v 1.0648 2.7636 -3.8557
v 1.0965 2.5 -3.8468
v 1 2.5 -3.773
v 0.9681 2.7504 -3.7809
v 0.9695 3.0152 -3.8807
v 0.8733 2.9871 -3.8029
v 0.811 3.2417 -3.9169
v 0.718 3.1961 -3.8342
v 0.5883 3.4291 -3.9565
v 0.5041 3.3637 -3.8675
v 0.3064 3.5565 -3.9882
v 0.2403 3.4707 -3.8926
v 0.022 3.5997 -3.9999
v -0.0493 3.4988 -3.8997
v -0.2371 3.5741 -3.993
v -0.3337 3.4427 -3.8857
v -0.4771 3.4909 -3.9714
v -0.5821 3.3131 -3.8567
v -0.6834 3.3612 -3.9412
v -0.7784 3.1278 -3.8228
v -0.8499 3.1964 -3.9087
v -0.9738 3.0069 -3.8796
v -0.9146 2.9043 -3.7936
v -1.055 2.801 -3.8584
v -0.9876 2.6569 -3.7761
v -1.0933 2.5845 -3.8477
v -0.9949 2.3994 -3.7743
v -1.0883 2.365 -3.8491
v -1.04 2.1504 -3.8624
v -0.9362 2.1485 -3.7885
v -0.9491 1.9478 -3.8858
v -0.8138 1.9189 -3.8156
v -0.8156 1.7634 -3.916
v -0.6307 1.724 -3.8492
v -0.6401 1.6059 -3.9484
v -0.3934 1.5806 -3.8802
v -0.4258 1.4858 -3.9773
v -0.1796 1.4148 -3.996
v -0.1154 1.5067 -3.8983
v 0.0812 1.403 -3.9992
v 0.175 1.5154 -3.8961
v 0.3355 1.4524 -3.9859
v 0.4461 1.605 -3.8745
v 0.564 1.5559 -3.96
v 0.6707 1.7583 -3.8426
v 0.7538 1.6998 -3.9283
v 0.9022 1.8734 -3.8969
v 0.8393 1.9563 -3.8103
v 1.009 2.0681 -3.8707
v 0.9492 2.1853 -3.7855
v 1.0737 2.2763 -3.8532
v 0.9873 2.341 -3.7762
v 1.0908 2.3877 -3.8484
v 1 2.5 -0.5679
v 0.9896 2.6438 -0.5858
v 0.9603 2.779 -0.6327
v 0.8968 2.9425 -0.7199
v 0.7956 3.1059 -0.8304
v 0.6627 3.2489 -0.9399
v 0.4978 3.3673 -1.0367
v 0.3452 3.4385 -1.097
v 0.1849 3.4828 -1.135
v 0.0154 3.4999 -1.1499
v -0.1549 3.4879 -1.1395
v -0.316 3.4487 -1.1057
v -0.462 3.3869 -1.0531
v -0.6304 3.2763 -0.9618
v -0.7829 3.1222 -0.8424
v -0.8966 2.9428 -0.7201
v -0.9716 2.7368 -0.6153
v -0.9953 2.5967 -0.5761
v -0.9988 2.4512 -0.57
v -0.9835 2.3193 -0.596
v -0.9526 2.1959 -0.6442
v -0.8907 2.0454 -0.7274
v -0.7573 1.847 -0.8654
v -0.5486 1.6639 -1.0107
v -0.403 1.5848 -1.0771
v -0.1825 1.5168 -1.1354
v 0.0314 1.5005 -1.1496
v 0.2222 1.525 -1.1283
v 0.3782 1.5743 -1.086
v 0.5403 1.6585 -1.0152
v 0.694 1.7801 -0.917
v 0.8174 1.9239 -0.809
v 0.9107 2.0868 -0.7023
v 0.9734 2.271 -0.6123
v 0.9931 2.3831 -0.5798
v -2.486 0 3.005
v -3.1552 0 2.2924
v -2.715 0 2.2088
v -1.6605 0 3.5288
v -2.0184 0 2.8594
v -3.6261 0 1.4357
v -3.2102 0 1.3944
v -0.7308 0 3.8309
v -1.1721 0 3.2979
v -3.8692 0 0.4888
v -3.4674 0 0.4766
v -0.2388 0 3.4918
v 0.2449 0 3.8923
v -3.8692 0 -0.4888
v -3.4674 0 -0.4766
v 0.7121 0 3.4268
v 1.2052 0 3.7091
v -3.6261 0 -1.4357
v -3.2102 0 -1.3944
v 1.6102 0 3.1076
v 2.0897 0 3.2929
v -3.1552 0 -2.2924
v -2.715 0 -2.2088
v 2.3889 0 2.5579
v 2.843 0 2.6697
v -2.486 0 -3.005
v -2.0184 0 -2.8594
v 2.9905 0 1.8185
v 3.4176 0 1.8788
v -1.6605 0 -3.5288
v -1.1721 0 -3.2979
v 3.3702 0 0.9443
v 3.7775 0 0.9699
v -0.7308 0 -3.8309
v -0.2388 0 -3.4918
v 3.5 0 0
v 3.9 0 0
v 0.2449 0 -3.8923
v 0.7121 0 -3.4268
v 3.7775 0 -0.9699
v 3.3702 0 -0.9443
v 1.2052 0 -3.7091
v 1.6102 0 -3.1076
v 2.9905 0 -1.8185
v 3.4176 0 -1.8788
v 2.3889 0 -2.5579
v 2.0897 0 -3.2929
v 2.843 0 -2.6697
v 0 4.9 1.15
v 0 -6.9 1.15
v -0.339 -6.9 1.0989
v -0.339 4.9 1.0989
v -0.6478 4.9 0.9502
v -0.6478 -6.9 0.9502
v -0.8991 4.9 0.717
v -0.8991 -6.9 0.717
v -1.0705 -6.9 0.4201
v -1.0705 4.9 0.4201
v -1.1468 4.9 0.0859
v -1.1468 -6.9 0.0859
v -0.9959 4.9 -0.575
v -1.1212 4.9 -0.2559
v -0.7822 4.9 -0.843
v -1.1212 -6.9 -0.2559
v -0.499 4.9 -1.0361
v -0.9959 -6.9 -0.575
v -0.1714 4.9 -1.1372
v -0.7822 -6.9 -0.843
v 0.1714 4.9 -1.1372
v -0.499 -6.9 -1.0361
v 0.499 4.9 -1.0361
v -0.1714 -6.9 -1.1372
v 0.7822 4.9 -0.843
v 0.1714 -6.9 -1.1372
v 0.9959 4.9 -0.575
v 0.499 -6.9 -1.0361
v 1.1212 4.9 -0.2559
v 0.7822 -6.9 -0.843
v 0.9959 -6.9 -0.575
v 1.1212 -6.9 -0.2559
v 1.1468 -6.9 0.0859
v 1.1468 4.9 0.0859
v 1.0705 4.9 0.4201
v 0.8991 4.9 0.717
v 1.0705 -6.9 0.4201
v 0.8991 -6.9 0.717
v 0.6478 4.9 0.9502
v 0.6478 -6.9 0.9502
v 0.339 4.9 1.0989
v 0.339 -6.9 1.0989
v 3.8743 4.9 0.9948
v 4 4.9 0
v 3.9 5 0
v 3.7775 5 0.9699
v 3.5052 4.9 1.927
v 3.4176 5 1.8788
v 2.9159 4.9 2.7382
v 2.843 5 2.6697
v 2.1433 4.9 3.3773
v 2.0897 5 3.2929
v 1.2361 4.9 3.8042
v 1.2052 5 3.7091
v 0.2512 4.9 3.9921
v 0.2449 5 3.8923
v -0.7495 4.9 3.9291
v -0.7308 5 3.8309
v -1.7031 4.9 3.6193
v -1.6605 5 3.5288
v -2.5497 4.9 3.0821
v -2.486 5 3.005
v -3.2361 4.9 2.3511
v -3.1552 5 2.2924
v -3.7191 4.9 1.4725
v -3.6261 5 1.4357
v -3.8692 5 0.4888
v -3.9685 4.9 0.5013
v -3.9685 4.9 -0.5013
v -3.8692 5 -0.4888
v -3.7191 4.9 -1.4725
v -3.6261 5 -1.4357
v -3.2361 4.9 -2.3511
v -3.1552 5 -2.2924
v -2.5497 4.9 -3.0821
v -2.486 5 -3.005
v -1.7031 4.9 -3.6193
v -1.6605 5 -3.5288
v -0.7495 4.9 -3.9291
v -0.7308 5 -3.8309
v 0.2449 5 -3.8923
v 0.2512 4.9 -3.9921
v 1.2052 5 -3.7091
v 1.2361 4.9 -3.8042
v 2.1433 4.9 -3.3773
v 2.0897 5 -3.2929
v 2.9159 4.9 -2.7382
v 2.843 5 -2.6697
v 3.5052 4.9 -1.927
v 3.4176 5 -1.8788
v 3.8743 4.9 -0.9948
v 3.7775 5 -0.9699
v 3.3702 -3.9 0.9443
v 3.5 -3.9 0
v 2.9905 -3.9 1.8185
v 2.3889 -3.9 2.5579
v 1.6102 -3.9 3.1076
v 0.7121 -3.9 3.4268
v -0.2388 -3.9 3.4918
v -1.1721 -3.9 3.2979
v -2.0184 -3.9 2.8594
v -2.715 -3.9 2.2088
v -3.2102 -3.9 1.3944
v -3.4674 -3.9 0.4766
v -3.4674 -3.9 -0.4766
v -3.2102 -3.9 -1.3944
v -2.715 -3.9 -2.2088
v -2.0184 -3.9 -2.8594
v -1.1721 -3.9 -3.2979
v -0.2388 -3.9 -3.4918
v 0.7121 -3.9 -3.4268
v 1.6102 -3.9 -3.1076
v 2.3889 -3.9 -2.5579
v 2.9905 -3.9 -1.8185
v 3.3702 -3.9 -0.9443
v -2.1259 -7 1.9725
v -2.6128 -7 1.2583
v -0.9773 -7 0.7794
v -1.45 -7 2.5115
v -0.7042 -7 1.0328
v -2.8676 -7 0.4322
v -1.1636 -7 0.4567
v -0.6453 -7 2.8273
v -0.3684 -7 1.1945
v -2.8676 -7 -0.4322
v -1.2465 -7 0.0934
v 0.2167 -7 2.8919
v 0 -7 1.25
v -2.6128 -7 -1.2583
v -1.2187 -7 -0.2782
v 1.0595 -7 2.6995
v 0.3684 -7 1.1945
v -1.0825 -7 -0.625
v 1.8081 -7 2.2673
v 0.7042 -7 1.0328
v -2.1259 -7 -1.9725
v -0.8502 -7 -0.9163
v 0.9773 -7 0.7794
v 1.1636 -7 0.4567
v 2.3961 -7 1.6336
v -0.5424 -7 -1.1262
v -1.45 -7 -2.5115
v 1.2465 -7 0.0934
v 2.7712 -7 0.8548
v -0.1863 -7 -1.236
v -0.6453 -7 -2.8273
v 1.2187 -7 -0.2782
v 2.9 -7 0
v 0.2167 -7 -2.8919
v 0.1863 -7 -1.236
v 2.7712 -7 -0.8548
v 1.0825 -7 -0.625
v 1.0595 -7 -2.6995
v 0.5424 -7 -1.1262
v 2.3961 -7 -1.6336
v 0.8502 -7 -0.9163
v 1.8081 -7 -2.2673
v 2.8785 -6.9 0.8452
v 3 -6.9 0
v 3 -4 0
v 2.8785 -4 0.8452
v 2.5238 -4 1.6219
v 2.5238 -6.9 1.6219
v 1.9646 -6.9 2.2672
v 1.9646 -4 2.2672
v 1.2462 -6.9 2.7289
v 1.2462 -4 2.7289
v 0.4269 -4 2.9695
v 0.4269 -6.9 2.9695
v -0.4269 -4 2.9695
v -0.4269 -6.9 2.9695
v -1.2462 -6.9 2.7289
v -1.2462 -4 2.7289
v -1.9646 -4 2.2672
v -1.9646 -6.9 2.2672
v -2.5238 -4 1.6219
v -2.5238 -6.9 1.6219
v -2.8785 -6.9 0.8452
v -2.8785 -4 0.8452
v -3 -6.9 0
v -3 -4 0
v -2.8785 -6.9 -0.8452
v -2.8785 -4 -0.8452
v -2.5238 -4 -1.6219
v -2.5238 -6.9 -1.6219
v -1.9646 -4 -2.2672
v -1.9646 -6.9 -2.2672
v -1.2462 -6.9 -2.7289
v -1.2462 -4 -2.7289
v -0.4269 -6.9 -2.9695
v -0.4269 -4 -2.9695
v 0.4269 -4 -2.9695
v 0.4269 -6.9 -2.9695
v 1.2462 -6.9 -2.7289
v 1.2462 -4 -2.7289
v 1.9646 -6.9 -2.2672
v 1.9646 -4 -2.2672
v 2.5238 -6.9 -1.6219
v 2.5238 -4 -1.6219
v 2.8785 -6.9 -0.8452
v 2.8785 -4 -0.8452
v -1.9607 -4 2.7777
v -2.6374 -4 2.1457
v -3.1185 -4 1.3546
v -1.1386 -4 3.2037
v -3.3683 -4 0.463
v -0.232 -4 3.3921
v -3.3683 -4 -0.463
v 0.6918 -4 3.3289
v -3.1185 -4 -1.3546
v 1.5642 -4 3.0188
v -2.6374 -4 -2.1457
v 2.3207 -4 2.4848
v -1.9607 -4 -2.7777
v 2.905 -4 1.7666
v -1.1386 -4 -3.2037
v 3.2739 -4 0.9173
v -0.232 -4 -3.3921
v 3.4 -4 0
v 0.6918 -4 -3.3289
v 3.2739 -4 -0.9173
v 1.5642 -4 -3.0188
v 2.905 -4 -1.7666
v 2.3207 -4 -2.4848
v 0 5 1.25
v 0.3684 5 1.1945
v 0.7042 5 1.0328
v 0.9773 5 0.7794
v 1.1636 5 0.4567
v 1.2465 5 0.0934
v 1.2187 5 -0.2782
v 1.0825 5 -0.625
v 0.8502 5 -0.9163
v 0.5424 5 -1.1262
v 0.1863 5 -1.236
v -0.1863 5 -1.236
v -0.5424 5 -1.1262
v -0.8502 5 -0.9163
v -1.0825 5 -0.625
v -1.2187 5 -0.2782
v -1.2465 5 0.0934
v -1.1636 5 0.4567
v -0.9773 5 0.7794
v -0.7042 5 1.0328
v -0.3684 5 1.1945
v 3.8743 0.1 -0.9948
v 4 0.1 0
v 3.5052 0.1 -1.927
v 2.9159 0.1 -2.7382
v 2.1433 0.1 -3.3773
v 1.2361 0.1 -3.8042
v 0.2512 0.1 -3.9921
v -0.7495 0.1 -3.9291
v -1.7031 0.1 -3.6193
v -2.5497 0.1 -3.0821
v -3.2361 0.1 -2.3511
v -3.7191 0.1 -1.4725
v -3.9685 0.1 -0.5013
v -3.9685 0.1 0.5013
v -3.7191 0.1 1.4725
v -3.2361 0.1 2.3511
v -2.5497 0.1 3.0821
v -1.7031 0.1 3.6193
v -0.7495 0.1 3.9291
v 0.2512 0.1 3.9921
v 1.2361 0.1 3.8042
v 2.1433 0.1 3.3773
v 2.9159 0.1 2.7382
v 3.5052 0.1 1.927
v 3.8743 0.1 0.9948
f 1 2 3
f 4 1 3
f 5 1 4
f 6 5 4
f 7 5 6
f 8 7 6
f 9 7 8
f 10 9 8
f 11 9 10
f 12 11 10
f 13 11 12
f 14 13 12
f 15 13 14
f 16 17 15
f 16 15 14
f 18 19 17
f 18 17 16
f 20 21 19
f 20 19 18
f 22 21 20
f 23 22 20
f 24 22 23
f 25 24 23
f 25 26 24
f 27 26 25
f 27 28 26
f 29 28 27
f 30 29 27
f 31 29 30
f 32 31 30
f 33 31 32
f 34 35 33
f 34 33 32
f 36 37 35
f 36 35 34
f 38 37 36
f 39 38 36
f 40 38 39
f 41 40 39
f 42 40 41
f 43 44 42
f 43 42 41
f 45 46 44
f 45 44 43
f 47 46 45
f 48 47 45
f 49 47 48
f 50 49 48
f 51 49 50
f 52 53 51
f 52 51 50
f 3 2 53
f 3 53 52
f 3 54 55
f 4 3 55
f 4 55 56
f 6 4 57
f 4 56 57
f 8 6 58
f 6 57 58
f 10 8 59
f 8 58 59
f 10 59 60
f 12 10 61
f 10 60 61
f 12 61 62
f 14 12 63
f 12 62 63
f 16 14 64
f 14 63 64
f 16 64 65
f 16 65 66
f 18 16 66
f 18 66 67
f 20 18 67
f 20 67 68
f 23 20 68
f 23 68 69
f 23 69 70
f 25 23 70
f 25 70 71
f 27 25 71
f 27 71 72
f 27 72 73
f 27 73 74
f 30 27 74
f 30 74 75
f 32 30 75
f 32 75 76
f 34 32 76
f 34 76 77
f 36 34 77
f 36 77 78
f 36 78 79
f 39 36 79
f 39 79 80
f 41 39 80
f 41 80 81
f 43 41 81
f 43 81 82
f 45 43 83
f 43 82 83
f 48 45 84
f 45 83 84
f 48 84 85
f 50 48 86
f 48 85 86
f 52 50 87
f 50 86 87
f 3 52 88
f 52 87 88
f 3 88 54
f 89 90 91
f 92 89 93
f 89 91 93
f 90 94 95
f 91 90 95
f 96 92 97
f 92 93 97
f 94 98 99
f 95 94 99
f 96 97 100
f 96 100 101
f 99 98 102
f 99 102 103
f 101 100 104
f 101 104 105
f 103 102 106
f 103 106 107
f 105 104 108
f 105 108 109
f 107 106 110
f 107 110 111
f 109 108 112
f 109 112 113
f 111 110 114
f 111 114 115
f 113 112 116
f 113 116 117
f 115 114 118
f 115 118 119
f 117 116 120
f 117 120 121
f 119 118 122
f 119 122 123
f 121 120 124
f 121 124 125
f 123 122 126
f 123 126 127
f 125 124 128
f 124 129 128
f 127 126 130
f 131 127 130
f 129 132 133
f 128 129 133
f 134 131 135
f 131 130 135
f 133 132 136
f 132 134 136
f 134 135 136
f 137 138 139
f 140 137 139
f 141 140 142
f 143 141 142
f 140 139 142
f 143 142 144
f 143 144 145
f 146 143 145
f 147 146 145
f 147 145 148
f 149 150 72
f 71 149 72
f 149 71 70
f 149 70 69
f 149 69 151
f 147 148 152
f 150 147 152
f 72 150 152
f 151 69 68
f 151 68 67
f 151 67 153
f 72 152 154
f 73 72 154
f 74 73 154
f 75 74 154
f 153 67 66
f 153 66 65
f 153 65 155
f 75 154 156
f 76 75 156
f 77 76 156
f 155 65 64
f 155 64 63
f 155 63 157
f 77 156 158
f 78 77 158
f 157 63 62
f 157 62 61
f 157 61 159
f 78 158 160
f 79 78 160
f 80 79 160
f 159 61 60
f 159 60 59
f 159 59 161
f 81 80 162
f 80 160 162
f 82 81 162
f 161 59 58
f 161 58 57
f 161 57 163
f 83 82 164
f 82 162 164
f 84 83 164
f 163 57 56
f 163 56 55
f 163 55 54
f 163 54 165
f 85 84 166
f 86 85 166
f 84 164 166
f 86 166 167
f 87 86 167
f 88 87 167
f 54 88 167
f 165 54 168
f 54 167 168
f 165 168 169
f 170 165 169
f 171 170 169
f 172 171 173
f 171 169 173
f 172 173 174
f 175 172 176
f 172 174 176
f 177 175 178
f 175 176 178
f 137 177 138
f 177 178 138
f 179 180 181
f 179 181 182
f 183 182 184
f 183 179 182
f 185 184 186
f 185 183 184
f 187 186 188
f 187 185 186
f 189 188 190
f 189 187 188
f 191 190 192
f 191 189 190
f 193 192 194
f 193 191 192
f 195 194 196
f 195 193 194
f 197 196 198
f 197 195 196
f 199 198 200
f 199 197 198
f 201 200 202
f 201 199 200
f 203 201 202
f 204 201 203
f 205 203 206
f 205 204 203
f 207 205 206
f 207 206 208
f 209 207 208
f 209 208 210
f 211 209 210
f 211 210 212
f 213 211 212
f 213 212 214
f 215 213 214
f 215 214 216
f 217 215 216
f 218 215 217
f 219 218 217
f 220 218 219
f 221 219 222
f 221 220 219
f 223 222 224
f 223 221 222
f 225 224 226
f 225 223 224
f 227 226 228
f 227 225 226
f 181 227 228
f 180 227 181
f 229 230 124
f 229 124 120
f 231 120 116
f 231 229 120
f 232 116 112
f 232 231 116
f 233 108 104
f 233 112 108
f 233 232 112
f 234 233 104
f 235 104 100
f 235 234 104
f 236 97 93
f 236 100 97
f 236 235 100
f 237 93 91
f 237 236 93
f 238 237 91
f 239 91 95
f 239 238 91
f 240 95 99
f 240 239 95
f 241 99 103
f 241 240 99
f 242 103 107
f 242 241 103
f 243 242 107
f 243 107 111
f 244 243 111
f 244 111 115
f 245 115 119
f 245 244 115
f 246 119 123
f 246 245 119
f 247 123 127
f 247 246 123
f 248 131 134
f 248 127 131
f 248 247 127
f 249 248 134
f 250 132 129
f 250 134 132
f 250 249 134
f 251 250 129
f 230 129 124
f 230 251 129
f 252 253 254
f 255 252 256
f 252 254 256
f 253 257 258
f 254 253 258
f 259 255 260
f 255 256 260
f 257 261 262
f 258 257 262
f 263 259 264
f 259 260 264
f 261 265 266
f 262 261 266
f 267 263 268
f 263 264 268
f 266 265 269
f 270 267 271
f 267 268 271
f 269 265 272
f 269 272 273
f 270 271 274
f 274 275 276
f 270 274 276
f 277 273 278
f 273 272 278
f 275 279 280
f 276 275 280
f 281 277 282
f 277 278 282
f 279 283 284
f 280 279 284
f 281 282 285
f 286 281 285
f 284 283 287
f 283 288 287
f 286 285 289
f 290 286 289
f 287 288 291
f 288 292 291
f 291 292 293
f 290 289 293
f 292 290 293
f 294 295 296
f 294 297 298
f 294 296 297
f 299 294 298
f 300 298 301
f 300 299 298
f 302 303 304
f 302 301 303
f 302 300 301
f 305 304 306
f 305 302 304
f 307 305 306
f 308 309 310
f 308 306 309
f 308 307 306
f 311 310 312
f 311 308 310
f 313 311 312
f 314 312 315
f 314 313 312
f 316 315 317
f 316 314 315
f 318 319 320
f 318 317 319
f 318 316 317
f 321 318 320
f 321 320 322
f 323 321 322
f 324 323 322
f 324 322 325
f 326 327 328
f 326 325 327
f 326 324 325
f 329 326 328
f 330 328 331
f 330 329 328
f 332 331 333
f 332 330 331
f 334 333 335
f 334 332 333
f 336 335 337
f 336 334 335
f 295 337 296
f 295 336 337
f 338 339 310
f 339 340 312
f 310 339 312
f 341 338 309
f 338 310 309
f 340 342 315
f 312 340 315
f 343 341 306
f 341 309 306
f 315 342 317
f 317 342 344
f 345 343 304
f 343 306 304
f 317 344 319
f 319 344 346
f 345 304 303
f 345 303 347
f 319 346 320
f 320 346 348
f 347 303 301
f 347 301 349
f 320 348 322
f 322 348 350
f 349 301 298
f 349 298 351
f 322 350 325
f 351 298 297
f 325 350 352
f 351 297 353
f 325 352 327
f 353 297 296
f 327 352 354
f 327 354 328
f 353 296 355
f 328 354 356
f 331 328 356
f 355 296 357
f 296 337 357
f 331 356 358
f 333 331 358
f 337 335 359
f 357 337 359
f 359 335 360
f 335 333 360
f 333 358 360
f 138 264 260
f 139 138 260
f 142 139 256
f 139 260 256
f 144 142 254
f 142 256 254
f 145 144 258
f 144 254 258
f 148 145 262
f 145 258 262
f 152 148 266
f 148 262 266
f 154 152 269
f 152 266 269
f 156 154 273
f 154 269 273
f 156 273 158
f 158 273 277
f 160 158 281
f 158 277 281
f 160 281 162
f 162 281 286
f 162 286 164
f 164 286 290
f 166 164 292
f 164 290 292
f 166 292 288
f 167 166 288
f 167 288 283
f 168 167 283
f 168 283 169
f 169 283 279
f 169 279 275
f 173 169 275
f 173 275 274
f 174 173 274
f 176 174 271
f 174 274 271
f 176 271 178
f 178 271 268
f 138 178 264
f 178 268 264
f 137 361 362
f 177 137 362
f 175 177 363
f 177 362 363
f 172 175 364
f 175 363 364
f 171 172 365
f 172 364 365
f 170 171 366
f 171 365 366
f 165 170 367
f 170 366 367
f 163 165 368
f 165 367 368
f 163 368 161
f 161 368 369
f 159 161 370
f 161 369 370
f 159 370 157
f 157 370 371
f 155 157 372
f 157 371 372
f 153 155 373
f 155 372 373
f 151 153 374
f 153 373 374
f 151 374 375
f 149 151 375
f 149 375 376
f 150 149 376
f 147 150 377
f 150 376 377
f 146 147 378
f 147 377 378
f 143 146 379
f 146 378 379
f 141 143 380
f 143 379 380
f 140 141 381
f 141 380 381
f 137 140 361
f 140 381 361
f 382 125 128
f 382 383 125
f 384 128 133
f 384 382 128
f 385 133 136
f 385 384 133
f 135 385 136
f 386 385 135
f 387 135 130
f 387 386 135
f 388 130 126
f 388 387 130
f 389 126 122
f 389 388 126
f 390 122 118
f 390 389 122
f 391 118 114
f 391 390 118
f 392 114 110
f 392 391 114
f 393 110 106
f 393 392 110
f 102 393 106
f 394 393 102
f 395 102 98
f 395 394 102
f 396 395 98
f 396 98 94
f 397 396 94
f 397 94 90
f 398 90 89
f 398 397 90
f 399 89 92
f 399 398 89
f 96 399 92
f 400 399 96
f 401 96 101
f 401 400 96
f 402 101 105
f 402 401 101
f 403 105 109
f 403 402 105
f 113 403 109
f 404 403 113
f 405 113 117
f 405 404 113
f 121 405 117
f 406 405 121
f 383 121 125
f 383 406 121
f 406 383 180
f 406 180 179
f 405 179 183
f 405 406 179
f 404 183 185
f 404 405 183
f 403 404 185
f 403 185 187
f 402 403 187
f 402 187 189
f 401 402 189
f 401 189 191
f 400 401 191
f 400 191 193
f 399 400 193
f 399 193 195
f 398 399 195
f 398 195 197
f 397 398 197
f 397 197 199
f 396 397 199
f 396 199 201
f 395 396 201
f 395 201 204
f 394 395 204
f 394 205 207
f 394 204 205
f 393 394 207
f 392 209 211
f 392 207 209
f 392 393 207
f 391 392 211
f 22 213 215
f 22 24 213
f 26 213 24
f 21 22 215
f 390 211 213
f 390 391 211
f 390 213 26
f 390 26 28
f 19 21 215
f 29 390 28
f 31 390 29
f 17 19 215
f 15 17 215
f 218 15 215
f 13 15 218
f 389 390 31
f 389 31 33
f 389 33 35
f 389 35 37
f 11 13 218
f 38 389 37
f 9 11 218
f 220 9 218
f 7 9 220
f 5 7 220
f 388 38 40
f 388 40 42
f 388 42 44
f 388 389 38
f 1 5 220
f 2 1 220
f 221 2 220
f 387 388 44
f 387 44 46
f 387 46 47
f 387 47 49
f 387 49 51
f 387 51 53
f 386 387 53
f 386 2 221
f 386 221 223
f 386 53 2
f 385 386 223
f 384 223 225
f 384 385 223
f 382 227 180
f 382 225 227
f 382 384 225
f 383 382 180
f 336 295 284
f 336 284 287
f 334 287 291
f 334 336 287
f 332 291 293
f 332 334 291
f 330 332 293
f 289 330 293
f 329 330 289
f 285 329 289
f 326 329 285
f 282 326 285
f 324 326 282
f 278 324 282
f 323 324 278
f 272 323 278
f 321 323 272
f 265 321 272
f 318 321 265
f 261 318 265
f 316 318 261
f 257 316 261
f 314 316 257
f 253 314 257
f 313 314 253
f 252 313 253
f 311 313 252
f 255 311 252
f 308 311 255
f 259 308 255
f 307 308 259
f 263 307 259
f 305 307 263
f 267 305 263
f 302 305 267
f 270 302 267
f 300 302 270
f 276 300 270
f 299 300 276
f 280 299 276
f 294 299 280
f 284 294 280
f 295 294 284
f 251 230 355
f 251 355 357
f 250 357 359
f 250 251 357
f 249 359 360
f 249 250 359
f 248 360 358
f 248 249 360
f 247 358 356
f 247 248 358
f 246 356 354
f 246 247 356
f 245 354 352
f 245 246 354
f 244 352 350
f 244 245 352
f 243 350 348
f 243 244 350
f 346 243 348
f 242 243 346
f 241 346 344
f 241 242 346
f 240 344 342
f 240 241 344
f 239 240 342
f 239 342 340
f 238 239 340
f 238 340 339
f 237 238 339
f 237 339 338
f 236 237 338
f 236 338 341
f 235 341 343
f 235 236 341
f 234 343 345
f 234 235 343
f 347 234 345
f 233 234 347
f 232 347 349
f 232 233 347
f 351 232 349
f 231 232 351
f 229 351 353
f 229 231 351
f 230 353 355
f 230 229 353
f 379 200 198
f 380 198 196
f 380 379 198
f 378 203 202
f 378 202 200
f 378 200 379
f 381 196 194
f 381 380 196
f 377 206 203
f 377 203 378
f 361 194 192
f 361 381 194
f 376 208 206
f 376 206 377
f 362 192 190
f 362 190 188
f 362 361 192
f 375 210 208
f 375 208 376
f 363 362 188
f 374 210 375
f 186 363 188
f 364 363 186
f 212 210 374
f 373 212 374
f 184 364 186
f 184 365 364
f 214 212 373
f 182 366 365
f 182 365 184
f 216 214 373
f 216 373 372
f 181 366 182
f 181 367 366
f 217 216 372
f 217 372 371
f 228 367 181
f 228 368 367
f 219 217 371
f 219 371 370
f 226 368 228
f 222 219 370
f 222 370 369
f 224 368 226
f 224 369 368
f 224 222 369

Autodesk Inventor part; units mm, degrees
ref_plane "YZ Plane" through (0, 0, 0) normal (1, 0, 0) x (0, 1, 0)
ref_plane "XZ Plane" through (0, 0, 0) normal (0, 1, 0) x (-1, 0, 0)
ref_plane "XY Plane" through (0, 0, 0) normal (0, 0, 1) x (1, 0, 0)
sketch "Skizze1" plane through (0, 0, 0) normal (0, 0, 1) x (1, 0, 0)
  line L0 (0, 5) -> (4, 5)
  line L1 (4, 5) -> (4, 0)
  line L2 (4, 0) -> (3, 0)
  line L3 (3, 0) -> (3, -7)
  line L4 (3, -7) -> (0, -7)
  line L5 (0, -7) -> (0, 5)
  line L6 (3.5, 0) -> (3.5, -4)
  line L7 (3.5, -4) -> (3, -4)
  point P0 (0, 0)
  dimension "d0" = 6
  dimension "d1" = 7
  dimension "d2" = 8
  dimension "d3" = 5
  dimension "d31" = 7
  dimension "d32" = 4
revolve "Umdrehung1" add sketch "Skizze1" angle 360 about axis through (0, -7, 0) along (0, 1, 0)
chamfer "Fase1" distance 0.1 angle 45 4 edges at (-4, 5, 0) (-3, -7, 0) (-4, 0, 0) (-3.5, -4, 0)
hole "Bohrung1" at (0, 5, 0) direction (0, -1, 0) diameter 2.3 end through all both
chamfer "Fase2" distance 0.1 angle 45 2 edges at (0, -7, -1.15) (0, 5, -1.15)
sketch "Skizze2" plane through (0, 0, 0) normal (0, 0, 1) x (1, 0, 0)
  circle A0 centre (0, 2.5) radius 1
  line L0 (1.25, 5) -> (-1.25, 5) projected
  line L1 (0, 7.4) -> (0, -9.4) projected
  point P0 (0, 0)
  dimension "d20" = 2
  dimension "d21" = 2.5
extrude "Extrusion1" cut sketch "Skizze2" against normal blind 10
chamfer "Fase3" distance 0.1 angle 45 1 edges at (-1, 2.5012, -3.873)
thread "Gewinde1" size "M2x0.4" class "6H" standard "ANSI Metric M Profile" full length
properties part number "nabe" material "Aluminium 6061"
